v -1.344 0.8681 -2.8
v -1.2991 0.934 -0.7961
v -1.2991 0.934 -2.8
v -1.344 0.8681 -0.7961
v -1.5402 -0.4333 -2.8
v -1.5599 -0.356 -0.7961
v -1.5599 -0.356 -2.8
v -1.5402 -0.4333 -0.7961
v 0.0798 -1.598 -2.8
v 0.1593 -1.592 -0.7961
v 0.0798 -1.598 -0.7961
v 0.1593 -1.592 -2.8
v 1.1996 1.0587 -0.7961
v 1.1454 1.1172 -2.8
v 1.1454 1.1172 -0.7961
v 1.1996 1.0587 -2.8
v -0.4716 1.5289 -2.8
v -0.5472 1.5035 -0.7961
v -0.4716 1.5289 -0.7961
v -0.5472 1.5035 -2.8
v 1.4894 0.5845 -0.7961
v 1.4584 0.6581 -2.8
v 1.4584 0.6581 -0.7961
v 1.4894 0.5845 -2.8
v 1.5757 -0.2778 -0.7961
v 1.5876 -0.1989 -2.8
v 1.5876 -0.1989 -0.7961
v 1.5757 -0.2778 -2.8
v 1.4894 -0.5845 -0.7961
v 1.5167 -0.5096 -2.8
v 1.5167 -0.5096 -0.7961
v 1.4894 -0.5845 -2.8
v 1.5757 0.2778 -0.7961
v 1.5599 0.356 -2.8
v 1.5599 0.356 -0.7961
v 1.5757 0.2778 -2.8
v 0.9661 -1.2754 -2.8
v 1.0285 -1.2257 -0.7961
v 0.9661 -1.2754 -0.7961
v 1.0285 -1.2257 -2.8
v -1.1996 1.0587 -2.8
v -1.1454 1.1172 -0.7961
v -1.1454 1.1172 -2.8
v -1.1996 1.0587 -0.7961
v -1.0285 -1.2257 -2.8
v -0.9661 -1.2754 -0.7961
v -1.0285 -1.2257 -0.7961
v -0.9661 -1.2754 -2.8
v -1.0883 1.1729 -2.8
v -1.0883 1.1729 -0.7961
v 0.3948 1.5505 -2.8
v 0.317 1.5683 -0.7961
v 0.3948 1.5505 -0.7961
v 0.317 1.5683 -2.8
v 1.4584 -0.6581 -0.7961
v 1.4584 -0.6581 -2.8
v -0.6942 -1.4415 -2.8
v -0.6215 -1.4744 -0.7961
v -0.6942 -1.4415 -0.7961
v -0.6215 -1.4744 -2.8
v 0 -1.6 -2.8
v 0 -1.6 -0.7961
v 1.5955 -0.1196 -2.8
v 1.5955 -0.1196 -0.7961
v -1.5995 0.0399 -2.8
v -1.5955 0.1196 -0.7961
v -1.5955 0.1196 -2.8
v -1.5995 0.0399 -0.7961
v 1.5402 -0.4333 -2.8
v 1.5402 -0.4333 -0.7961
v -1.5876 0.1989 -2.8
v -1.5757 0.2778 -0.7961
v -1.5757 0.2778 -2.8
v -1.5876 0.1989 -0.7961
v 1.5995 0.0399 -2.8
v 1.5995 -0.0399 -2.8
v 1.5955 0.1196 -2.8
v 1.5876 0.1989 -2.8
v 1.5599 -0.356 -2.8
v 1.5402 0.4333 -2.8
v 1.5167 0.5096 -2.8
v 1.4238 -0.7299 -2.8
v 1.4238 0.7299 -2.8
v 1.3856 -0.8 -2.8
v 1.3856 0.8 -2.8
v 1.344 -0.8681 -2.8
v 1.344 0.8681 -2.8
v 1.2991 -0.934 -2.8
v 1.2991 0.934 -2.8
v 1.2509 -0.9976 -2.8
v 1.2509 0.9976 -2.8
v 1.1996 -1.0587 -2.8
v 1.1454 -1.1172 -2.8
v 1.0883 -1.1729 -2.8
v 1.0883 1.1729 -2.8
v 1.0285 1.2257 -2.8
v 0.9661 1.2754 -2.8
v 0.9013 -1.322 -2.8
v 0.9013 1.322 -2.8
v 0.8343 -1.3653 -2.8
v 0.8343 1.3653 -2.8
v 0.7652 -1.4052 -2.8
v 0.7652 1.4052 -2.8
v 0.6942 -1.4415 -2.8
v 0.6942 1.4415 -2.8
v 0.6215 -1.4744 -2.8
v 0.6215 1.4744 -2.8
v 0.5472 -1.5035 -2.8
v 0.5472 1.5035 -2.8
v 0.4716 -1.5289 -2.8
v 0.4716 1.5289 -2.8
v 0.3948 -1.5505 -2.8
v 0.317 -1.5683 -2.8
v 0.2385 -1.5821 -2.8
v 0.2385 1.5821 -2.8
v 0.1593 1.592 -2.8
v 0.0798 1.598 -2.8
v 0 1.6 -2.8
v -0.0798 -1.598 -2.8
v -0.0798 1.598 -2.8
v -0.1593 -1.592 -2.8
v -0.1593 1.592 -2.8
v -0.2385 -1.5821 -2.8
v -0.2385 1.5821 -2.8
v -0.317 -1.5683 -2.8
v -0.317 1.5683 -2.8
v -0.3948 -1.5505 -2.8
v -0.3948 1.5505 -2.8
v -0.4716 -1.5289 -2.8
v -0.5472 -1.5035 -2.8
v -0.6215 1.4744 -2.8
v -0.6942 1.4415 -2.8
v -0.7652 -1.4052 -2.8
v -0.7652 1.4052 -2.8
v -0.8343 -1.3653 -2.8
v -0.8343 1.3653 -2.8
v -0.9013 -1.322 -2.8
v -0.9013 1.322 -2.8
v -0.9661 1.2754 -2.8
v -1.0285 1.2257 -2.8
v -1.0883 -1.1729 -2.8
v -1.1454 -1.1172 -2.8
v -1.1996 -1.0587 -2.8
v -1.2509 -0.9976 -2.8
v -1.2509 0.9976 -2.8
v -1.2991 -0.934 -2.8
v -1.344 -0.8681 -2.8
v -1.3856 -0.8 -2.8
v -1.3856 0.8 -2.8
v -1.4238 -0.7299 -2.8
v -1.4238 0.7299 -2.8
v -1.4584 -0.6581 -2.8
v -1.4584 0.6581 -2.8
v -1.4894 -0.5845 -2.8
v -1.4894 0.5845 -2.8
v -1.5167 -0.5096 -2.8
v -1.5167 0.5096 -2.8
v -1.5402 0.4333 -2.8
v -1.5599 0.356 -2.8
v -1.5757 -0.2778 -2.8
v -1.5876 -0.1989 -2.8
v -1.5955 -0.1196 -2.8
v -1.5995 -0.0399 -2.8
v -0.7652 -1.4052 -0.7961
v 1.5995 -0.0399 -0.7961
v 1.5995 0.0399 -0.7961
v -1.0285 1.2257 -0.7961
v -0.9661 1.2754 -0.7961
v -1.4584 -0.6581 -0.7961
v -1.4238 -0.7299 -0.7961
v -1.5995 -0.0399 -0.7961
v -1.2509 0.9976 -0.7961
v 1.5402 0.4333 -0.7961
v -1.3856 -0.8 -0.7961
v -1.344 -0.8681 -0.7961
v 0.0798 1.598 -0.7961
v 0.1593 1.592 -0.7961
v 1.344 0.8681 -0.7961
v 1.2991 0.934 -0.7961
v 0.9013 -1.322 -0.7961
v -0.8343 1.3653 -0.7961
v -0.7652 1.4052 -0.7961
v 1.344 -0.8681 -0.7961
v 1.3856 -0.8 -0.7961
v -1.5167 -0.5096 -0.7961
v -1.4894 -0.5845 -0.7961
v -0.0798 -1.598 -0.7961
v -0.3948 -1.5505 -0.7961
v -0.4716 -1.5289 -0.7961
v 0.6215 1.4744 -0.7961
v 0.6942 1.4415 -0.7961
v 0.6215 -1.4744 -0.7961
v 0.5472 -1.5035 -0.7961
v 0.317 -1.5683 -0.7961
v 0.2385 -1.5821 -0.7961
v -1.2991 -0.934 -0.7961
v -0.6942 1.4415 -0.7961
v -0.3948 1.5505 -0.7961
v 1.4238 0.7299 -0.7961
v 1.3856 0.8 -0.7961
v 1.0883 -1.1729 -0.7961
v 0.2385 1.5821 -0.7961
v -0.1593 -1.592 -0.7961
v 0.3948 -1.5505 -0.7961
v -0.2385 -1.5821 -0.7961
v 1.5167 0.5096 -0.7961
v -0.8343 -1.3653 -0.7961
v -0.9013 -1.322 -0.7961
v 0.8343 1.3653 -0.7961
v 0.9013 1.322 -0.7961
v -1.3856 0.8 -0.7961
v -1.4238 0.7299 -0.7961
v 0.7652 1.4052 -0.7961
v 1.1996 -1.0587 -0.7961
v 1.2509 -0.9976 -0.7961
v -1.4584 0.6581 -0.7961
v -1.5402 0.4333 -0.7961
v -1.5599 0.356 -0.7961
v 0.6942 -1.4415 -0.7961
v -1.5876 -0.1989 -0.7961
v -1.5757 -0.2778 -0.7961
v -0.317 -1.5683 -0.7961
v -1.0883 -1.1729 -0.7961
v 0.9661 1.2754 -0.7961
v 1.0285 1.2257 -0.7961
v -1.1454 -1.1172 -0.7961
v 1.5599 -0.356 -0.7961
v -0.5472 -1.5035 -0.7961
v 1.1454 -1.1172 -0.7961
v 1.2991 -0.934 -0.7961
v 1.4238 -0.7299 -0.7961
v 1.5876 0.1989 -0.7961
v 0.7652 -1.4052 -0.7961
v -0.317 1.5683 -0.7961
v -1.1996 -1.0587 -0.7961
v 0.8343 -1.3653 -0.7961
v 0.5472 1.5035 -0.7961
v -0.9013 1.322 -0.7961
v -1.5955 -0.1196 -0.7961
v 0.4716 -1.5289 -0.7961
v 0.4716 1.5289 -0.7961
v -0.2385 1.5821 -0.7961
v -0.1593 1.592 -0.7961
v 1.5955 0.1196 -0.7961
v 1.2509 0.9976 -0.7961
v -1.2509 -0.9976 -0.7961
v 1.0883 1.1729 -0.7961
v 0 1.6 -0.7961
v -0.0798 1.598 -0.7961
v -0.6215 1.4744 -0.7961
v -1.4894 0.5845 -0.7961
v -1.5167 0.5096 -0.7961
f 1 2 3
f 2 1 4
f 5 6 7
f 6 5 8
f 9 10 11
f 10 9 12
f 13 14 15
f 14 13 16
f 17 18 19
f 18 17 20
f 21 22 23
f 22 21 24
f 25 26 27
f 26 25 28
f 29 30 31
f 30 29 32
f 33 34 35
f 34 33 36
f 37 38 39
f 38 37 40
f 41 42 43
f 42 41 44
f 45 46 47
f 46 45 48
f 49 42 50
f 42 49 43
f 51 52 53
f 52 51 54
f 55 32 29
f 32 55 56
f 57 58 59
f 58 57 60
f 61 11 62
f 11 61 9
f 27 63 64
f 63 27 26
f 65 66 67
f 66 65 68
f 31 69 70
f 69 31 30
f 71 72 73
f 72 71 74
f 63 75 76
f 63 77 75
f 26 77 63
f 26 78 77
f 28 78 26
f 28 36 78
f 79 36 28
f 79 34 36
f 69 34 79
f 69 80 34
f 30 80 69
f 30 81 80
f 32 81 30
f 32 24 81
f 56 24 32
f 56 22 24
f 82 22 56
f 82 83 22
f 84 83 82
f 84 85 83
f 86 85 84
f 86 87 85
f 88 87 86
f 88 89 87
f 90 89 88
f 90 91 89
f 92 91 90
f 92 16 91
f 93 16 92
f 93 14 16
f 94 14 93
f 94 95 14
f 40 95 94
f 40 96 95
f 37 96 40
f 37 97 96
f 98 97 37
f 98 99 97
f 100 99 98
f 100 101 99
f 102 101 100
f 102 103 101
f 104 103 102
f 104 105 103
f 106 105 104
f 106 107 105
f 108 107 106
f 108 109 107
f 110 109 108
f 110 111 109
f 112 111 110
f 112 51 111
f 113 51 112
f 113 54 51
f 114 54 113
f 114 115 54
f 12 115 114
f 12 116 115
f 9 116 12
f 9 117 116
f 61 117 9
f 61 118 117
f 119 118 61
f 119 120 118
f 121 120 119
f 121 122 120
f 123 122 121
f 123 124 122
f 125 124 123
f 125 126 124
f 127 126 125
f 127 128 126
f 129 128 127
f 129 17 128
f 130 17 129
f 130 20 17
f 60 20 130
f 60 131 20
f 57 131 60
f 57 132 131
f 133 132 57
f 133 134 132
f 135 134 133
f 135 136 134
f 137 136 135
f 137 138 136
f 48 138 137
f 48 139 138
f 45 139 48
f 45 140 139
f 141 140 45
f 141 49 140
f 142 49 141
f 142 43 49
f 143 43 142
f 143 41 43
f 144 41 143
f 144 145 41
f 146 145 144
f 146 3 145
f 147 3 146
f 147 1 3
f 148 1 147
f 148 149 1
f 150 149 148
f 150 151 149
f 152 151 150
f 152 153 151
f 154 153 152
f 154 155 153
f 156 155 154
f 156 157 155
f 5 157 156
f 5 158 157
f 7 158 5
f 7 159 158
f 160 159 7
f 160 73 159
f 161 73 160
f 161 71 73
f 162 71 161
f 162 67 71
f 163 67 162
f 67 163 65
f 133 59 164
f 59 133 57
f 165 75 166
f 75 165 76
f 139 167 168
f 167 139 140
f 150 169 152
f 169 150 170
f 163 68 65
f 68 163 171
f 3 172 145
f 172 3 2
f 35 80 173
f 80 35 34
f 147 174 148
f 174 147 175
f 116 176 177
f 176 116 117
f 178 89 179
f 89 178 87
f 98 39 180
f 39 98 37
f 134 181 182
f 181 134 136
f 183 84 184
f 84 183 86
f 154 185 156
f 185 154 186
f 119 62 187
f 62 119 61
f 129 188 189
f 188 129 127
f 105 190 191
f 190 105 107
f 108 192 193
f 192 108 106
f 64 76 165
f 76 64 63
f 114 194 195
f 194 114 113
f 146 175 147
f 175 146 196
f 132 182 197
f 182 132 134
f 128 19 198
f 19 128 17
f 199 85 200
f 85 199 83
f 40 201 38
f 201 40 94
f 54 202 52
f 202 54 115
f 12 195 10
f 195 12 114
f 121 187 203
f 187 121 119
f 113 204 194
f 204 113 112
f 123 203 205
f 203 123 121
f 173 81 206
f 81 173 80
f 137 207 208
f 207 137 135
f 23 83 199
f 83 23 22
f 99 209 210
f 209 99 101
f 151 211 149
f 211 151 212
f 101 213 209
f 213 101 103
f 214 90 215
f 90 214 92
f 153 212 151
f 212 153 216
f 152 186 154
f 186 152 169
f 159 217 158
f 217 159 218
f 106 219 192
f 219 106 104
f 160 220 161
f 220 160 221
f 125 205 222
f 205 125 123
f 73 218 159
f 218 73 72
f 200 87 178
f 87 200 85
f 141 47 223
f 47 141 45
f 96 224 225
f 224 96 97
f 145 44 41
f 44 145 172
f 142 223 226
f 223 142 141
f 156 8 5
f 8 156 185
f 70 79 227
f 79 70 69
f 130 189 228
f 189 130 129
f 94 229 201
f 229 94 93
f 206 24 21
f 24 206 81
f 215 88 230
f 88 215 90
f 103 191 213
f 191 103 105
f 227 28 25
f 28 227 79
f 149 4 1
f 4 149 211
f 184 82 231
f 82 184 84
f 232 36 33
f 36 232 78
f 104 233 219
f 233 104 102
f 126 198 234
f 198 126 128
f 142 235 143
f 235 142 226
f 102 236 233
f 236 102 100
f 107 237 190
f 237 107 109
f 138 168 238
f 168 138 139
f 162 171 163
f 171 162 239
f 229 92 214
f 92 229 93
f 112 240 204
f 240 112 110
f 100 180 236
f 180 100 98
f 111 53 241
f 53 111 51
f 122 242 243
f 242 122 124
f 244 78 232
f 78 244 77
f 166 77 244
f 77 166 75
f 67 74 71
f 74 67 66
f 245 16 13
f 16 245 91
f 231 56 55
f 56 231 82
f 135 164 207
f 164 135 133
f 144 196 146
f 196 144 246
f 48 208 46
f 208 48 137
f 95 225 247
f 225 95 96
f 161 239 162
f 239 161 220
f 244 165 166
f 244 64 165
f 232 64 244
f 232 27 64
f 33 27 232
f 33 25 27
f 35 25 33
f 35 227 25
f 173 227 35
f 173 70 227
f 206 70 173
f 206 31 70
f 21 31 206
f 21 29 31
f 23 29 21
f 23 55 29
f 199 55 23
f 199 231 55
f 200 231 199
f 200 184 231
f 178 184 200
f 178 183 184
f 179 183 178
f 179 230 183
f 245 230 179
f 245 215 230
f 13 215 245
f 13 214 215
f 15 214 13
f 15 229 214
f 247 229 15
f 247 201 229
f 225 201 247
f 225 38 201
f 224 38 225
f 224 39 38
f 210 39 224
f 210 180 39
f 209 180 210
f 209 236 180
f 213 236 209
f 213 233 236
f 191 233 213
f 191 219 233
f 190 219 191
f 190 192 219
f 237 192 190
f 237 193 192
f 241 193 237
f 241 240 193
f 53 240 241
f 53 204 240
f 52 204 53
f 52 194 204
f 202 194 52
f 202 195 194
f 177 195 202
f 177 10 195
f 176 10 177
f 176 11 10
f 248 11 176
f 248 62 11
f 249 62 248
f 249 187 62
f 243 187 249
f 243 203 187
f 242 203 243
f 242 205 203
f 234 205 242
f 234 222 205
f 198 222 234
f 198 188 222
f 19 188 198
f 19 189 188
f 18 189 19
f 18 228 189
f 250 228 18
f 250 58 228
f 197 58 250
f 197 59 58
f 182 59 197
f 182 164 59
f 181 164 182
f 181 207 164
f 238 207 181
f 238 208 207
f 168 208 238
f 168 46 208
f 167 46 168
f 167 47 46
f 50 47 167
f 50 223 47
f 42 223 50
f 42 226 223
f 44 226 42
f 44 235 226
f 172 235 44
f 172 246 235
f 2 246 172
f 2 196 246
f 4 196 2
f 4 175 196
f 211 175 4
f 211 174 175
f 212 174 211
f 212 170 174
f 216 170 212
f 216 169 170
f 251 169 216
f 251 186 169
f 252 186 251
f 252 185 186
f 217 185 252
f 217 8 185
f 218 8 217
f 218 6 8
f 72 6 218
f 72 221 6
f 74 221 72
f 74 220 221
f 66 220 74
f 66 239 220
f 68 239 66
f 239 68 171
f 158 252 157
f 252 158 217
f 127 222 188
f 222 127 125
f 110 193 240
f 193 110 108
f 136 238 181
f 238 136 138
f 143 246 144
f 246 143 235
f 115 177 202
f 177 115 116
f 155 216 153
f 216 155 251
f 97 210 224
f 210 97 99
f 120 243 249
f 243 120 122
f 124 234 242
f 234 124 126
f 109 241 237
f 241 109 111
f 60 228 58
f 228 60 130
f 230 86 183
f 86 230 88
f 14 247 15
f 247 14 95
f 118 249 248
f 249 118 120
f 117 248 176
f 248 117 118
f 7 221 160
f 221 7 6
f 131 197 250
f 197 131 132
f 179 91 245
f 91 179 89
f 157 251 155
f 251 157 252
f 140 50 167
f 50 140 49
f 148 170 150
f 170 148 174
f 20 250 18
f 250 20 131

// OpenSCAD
use <../lib.scad>
use <s/3351as01.scad>
$fa=1; $fs=0.2;
function ldraw_lib__3351ap11(realsolid=false) = [
// 0 Roadsign Triangular Type 1 with Road Works with 2 Piles (Thin Worker) Pattern
// 0 Name: 3351ap11.dat
// 0 Author: J.C. Tchang [tchang]
// 0 !LDRAW_ORG Part UPDATE 2022-04
// 0 !LICENSE Licensed under CC BY 2.0 and CC BY 4.0 : see CAreadme.txt
// 
// 0 BFC CERTIFY CCW
  [0,"BFC","CERTIFY"],
  [0,"BFC","CCW"],
// 
// 0 !KEYWORDS Bricklink 649pb10b, Set 355, set 364, Set 989
// 
// 0 !HISTORY 2010-07-05 [PTadmin] Official Update 2010-02
// 0 !HISTORY 2022-06-22 [Philo] Updated description, added keywords
// 0 !HISTORY 2022-07-18 [PTadmin] Official Update 2022-04
// 
// 
// 1 16 0 0 0 1 0 0 0 1 0 0 0 1 s\3351as01.dat
  [1,16,0,0,0,1,0,0,0,1,0,0,0,1, ldraw_lib__s__3351as01(realsolid)],
// 0 //
// 4 4 -22 -70 -2 -22 -68 -2 22 -68 -2 22 -70 -2
  [4,4,-22,-70,-2,-22,-68,-2,22,-68,-2,22,-70,-2],
// 4 4 22 -70 -2 16.8 -73 -2 -16.8 -73 -2 -22 -70 -2
  [4,4,22,-70,-2,16.8,-73,-2,-16.8,-73,-2,-22,-70,-2],
// 4 4 22 -70 -2 22 -68 -2 23 -68.27 -2 23.73 -69 -2
  [4,4,22,-70,-2,22,-68,-2,23,-68.27,-2,23.73,-69,-2],
// 4 4 22 -70 -2 23.73 -69 -2 24 -70 -2 23.73 -71 -2
  [4,4,22,-70,-2,23.73,-69,-2,24,-70,-2,23.73,-71,-2],
// 4 4 22 -70 -2 23.73 -71 -2 1.73 -109.1 -2 0 -108.1 -2
  [4,4,22,-70,-2,23.73,-71,-2,1.73,-109.1,-2,0,-108.1,-2],
// 4 4 0 -108.1 -2 0 -102.1 -2 16.8 -73 -2 22 -70 -2
  [4,4,0,-108.1,-2,0,-102.1,-2,16.8,-73,-2,22,-70,-2],
// 4 4 -23 -68.27 -2 -22 -68 -2 -22 -70 -2 -23.73 -69 -2
  [4,4,-23,-68.27,-2,-22,-68,-2,-22,-70,-2,-23.73,-69,-2],
// 4 4 -24 -70 -2 -23.73 -69 -2 -22 -70 -2 -23.73 -71 -2
  [4,4,-24,-70,-2,-23.73,-69,-2,-22,-70,-2,-23.73,-71,-2],
// 4 4 0 -108.1 -2 -1.73 -109.1 -2 -23.73 -71 -2 -22 -70 -2
  [4,4,0,-108.1,-2,-1.73,-109.1,-2,-23.73,-71,-2,-22,-70,-2],
// 4 4 -22 -70 -2 -16.8 -73 -2 0 -102.1 -2 0 -108.1 -2
  [4,4,-22,-70,-2,-16.8,-73,-2,0,-102.1,-2,0,-108.1,-2],
// 4 4 -1 -109.83 -2 -1.73 -109.1 -2 0 -108.1 -2 0 -110.1 -2
  [4,4,-1,-109.83,-2,-1.73,-109.1,-2,0,-108.1,-2,0,-110.1,-2],
// 4 4 1 -109.83 -2 0 -110.1 -2 0 -108.1 -2 1.73 -109.1 -2
  [4,4,1,-109.83,-2,0,-110.1,-2,0,-108.1,-2,1.73,-109.1,-2],
// 0 //
// 4 0 -15.2 -73.8 -2 -7.6 -73.8 -2 -8.4 -74.8 -2 -14.4 -74.9 -2
  [4,0,-15.2,-73.8,-2,-7.6,-73.8,-2,-8.4,-74.8,-2,-14.4,-74.9,-2],
// 4 0 -8.9 -76.4 -2 -13.6 -76.4 -2 -14.4 -74.9 -2 -8.4 -74.8 -2
  [4,0,-8.9,-76.4,-2,-13.6,-76.4,-2,-14.4,-74.9,-2,-8.4,-74.8,-2],
// 4 0 -8.9 -76.4 -2 -9.4 -77 -2 -13 -77.2 -2 -13.6 -76.4 -2
  [4,0,-8.9,-76.4,-2,-9.4,-77,-2,-13,-77.2,-2,-13.6,-76.4,-2],
// 4 0 -10.7 -77.5 -2 -12.5 -77.7 -2 -13 -77.2 -2 -9.4 -77 -2
  [4,0,-10.7,-77.5,-2,-12.5,-77.7,-2,-13,-77.2,-2,-9.4,-77,-2],
// 4 0 -10.7 -77.5 -2 -11.2 -77.9 -2 -12 -77.9 -2 -12.5 -77.7 -2
  [4,0,-10.7,-77.5,-2,-11.2,-77.9,-2,-12,-77.9,-2,-12.5,-77.7,-2],
// 4 0 7.8 -80.8 -2 6.8 -79.6 -2 6.6 -78.7 -2 11 -80.7 -2
  [4,0,7.8,-80.8,-2,6.8,-79.6,-2,6.6,-78.7,-2,11,-80.7,-2],
// 4 0 11 -80.7 -2 10.1 -81.4 -2 9 -81.5 -2 7.8 -80.8 -2
  [4,0,11,-80.7,-2,10.1,-81.4,-2,9,-81.5,-2,7.8,-80.8,-2],
// 4 0 5.7 -78 -2 6.6 -77.8 -2 6.6 -78.7 -2 5.9 -78.8 -2
  [4,0,5.7,-78,-2,6.6,-77.8,-2,6.6,-78.7,-2,5.9,-78.8,-2],
// 4 0 5.9 -78.8 -2 5 -79.3 -2 4.5 -78.4 -2 5.7 -78 -2
  [4,0,5.9,-78.8,-2,5,-79.3,-2,4.5,-78.4,-2,5.7,-78,-2],
// 4 0 4.2 -79.8 -2 3.3 -79.3 -2 4.5 -78.4 -2 5 -79.3 -2
  [4,0,4.2,-79.8,-2,3.3,-79.3,-2,4.5,-78.4,-2,5,-79.3,-2],
// 4 0 3.5 -80.5 -2 2.9 -80.3 -2 3.3 -79.3 -2 4.2 -79.8 -2
  [4,0,3.5,-80.5,-2,2.9,-80.3,-2,3.3,-79.3,-2,4.2,-79.8,-2],
// 4 0 3.5 -80.5 -2 3 -81.4 -2 2.4 -81.1 -2 2.9 -80.3 -2
  [4,0,3.5,-80.5,-2,3,-81.4,-2,2.4,-81.1,-2,2.9,-80.3,-2],
// 4 0 2.4 -82.2 -2 2 -81.7 -2 2.4 -81.1 -2 3 -81.4 -2
  [4,0,2.4,-82.2,-2,2,-81.7,-2,2.4,-81.1,-2,3,-81.4,-2],
// 4 0 1.6 -83 -2 1.1 -82.5 -2 2 -81.7 -2 2.4 -82.2 -2
  [4,0,1.6,-83,-2,1.1,-82.5,-2,2,-81.7,-2,2.4,-82.2,-2],
// 4 0 1.6 -83 -2 1 -83.6 -2 0.3 -83.1 -2 1.1 -82.5 -2
  [4,0,1.6,-83,-2,1,-83.6,-2,0.3,-83.1,-2,1.1,-82.5,-2],
// 4 0 1 -83.6 -2 0.7 -84.7 -2 0 -84.4 -2 0.3 -83.1 -2
  [4,0,1,-83.6,-2,0.7,-84.7,-2,0,-84.4,-2,0.3,-83.1,-2],
// 4 0 0.5 -86.5 -2 -0.9 -86.3 -2 0 -84.4 -2 0.7 -84.7 -2
  [4,0,0.5,-86.5,-2,-0.9,-86.3,-2,0,-84.4,-2,0.7,-84.7,-2],
// 4 0 0 -84.4 -2 -0.6 -84.8 -2 -0.7 -83.8 -2 0.3 -83.1 -2
  [4,0,0,-84.4,-2,-0.6,-84.8,-2,-0.7,-83.8,-2,0.3,-83.1,-2],
// 4 0 -1.6 -85.5 -2 -1.8 -84.6 -2 -0.7 -83.8 -2 -0.6 -84.8 -2
  [4,0,-1.6,-85.5,-2,-1.8,-84.6,-2,-0.7,-83.8,-2,-0.6,-84.8,-2],
// 4 0 -1.6 -85.5 -2 -1.4 -86.2 -2 -4.4 -86.4 -2 -4.5 -86.1 -2
  [4,0,-1.6,-85.5,-2,-1.4,-86.2,-2,-4.4,-86.4,-2,-4.5,-86.1,-2],
// 4 0 -4.5 -86.1 -2 -4.9 -85.4 -2 -1.8 -84.6 -2 -1.6 -85.5 -2
  [4,0,-4.5,-86.1,-2,-4.9,-85.4,-2,-1.8,-84.6,-2,-1.6,-85.5,-2],
// 4 0 -4.9 -85.4 -2 -5.1 -84.6 -2 -2.8 -81.3 -2 -1.8 -84.6 -2
  [4,0,-4.9,-85.4,-2,-5.1,-84.6,-2,-2.8,-81.3,-2,-1.8,-84.6,-2],
// 4 0 -5.1 -84.6 -2 -5.2 -82.4 -2 -3.2 -80.1 -2 -2.8 -81.3 -2
  [4,0,-5.1,-84.6,-2,-5.2,-82.4,-2,-3.2,-80.1,-2,-2.8,-81.3,-2],
// 4 0 -5.2 -82.4 -2 -5.3 -81.1 -2 -3.5 -79.7 -2 -3.2 -80.1 -2
  [4,0,-5.2,-82.4,-2,-5.3,-81.1,-2,-3.5,-79.7,-2,-3.2,-80.1,-2],
// 4 0 -5.3 -81.1 -2 -5.8 -79.8 -2 -3.9 -79.2 -2 -3.5 -79.7 -2
  [4,0,-5.3,-81.1,-2,-5.8,-79.8,-2,-3.9,-79.2,-2,-3.5,-79.7,-2],
// 4 0 -5.8 -79.8 -2 -7.8 -76.7 -2 -6.3 -75.9 -2 -3.9 -79.2 -2
  [4,0,-5.8,-79.8,-2,-7.8,-76.7,-2,-6.3,-75.9,-2,-3.9,-79.2,-2],
// 4 0 -7.8 -76.7 -2 -8.1 -75.9 -2 -6.4 -74.8 -2 -6.3 -75.9 -2
  [4,0,-7.8,-76.7,-2,-8.1,-75.9,-2,-6.4,-74.8,-2,-6.3,-75.9,-2],
// 4 0 -8.1 -75.9 -2 -6.9 -74 -2 -6 -74.3 -2 -6.4 -74.8 -2
  [4,0,-8.1,-75.9,-2,-6.9,-74,-2,-6,-74.3,-2,-6.4,-74.8,-2],
// 4 0 -6.9 -74 -2 -6.5 -73.7 -2 -6.1 -73.8 -2 -6 -74.3 -2
  [4,0,-6.9,-74,-2,-6.5,-73.7,-2,-6.1,-73.8,-2,-6,-74.3,-2],
// 4 0 -2.8 -81.3 -2 -1.6 -79.5 -2 -0.3 -81.5 -2 -1.8 -84.6 -2
  [4,0,-2.8,-81.3,-2,-1.6,-79.5,-2,-0.3,-81.5,-2,-1.8,-84.6,-2],
// 4 0 -1.3 -78.1 -2 0.3 -79.9 -2 -0.3 -81.5 -2 -1.6 -79.5 -2
  [4,0,-1.3,-78.1,-2,0.3,-79.9,-2,-0.3,-81.5,-2,-1.6,-79.5,-2],
// 4 0 -1.3 -78.1 -2 -0.9 -74.8 -2 1 -75.1 -2 0.5 -79.1 -2
  [4,0,-1.3,-78.1,-2,-0.9,-74.8,-2,1,-75.1,-2,0.5,-79.1,-2],
// 3 0 -1.3 -78.1 -2 0.5 -79.1 -2 0.3 -79.9 -2
  [3,0,-1.3,-78.1,-2,0.5,-79.1,-2,0.3,-79.9,-2],
// 4 0 -0.7 -74.3 -2 1.2 -74.8 -2 1 -75.1 -2 -0.9 -74.8 -2
  [4,0,-0.7,-74.3,-2,1.2,-74.8,-2,1,-75.1,-2,-0.9,-74.8,-2],
// 3 0 -0.7 -74.3 -2 0 -73.7 -2 1.2 -74.8 -2
  [3,0,-0.7,-74.3,-2,0,-73.7,-2,1.2,-74.8,-2],
// 4 0 2 -73.7 -2 2.2 -74.2 -2 1.2 -74.8 -2 0 -73.7 -2
  [4,0,2,-73.7,-2,2.2,-74.2,-2,1.2,-74.8,-2,0,-73.7,-2],
// 4 0 2.6 -73.7 -2 2.5 -74 -2 2.2 -74.2 -2 2 -73.7 -2
  [4,0,2.6,-73.7,-2,2.5,-74,-2,2.2,-74.2,-2,2,-73.7,-2],
// 3 0 -1.4 -86.2 -2 -0.9 -86.3 -2 0.6 -90.4 -2
  [3,0,-1.4,-86.2,-2,-0.9,-86.3,-2,0.6,-90.4,-2],
// 3 0 -0.9 -86.3 -2 0.5 -86.5 -2 0.6 -90.4 -2
  [3,0,-0.9,-86.3,-2,0.5,-86.5,-2,0.6,-90.4,-2],
// 4 0 -4.6 -87.6 -2 -5 -86.9 -2 -4.4 -86.4 -2 -4 -87.2 -2
  [4,0,-4.6,-87.6,-2,-5,-86.9,-2,-4.4,-86.4,-2,-4,-87.2,-2],
// 4 0 -4.4 -86.4 -2 -1.4 -86.2 -2 0.6 -90.4 -2 -4 -87.2 -2
  [4,0,-4.4,-86.4,-2,-1.4,-86.2,-2,0.6,-90.4,-2,-4,-87.2,-2],
// 4 0 -4.1 -89.3 -2 -4.9 -88.6 -2 -4 -87.2 -2 -3.6 -89.1 -2
  [4,0,-4.1,-89.3,-2,-4.9,-88.6,-2,-4,-87.2,-2,-3.6,-89.1,-2],
// 4 0 0.6 -90.4 -2 -3.2 -89.7 -2 -3.6 -89.1 -2 -4 -87.2 -2
  [4,0,0.6,-90.4,-2,-3.2,-89.7,-2,-3.6,-89.1,-2,-4,-87.2,-2],
// 4 0 -4.1 -89.3 -2 -4.3 -90 -2 -5.5 -90.2 -2 -4.9 -88.6 -2
  [4,0,-4.1,-89.3,-2,-4.3,-90,-2,-5.5,-90.2,-2,-4.9,-88.6,-2],
// 4 0 -3.8 -90.5 -2 -5.3 -91.2 -2 -5.5 -90.2 -2 -4.3 -90 -2
  [4,0,-3.8,-90.5,-2,-5.3,-91.2,-2,-5.5,-90.2,-2,-4.3,-90,-2],
// 4 0 -3.2 -90.5 -2 -4.2 -91.7 -2 -5.3 -91.2 -2 -3.8 -90.5 -2
  [4,0,-3.2,-90.5,-2,-4.2,-91.7,-2,-5.3,-91.2,-2,-3.8,-90.5,-2],
// 3 0 -3.2 -90.5 -2 -0.5 -91.9 -2 -4.2 -91.7 -2
  [3,0,-3.2,-90.5,-2,-0.5,-91.9,-2,-4.2,-91.7,-2],
// 4 0 -0.5 -91.9 -2 -3.2 -90.5 -2 -3.2 -89.7 -2 0.6 -90.4 -2
  [4,0,-0.5,-91.9,-2,-3.2,-90.5,-2,-3.2,-89.7,-2,0.6,-90.4,-2],
// 4 0 0.9 -90.6 -2 0.3 -92.2 -2 -0.5 -91.9 -2 0.6 -90.4 -2
  [4,0,0.9,-90.6,-2,0.3,-92.2,-2,-0.5,-91.9,-2,0.6,-90.4,-2],
// 4 0 0.9 -90.6 -2 1.9 -90.5 -2 1.1 -93 -2 0.3 -92.2 -2
  [4,0,0.9,-90.6,-2,1.9,-90.5,-2,1.1,-93,-2,0.3,-92.2,-2],
// 4 0 1.9 -90.5 -2 2.4 -91 -2 1.5 -93.4 -2 1.1 -93 -2
  [4,0,1.9,-90.5,-2,2.4,-91,-2,1.5,-93.4,-2,1.1,-93,-2],
// 4 0 2.4 -91 -2 2.9 -91.1 -2 3 -91.8 -2 1.5 -93.4 -2
  [4,0,2.4,-91,-2,2.9,-91.1,-2,3,-91.8,-2,1.5,-93.4,-2],
// 4 0 3.2 -92.3 -2 2.2 -93.6 -2 1.5 -93.4 -2 3 -91.8 -2
  [4,0,3.2,-92.3,-2,2.2,-93.6,-2,1.5,-93.4,-2,3,-91.8,-2],
// 4 0 3.2 -92.3 -2 2.9 -93 -2 2.6 -93.3 -2 2.2 -93.6 -2
  [4,0,3.2,-92.3,-2,2.9,-93,-2,2.6,-93.3,-2,2.2,-93.6,-2],
// 3 0 11 -80.7 -2 6.6 -78.7 -2 6.6 -77.8 -2
  [3,0,11,-80.7,-2,6.6,-78.7,-2,6.6,-77.8,-2],
// 4 0 3.7 -73.8 -2 15.1 -73.8 -2 11 -80.7 -2 6.6 -77.8 -2
  [4,0,3.7,-73.8,-2,15.1,-73.8,-2,11,-80.7,-2,6.6,-77.8,-2],
// 0 //
// 4 16 -0.9 -86.3 -2 -1.4 -86.2 -2 -1.6 -85.5 -2 -0.6 -84.8 -2
  [4,16,-0.9,-86.3,-2,-1.4,-86.2,-2,-1.6,-85.5,-2,-0.6,-84.8,-2],
// 3 16 0 -84.4 -2 -0.9 -86.3 -2 -0.6 -84.8 -2
  [3,16,0,-84.4,-2,-0.9,-86.3,-2,-0.6,-84.8,-2],
// 4 16 -4.3 -90 -2 -4.1 -89.3 -2 -3.6 -89.1 -2 -3.2 -89.7 -2
  [4,16,-4.3,-90,-2,-4.1,-89.3,-2,-3.6,-89.1,-2,-3.2,-89.7,-2],
// 4 16 -3.2 -89.7 -2 -3.2 -90.5 -2 -3.8 -90.5 -2 -4.3 -90 -2
  [4,16,-3.2,-89.7,-2,-3.2,-90.5,-2,-3.8,-90.5,-2,-4.3,-90,-2],
// 3 16 -1.6 -79.5 -2 -2.8 -81.3 -2 -3.2 -80.1 -2
  [3,16,-1.6,-79.5,-2,-2.8,-81.3,-2,-3.2,-80.1,-2],
// 3 16 -1.6 -79.5 -2 -3.2 -80.1 -2 -3.5 -79.7 -2
  [3,16,-1.6,-79.5,-2,-3.2,-80.1,-2,-3.5,-79.7,-2],
// 4 16 -3.5 -79.7 -2 -3.9 -79.2 -2 -1.3 -78.1 -2 -1.6 -79.5 -2
  [4,16,-3.5,-79.7,-2,-3.9,-79.2,-2,-1.3,-78.1,-2,-1.6,-79.5,-2],
// 4 16 -3.9 -79.2 -2 -6.3 -75.9 -2 -0.9 -74.8 -2 -1.3 -78.1 -2
  [4,16,-3.9,-79.2,-2,-6.3,-75.9,-2,-0.9,-74.8,-2,-1.3,-78.1,-2],
// 4 16 -6.3 -75.9 -2 -6.4 -74.8 -2 -0.7 -74.3 -2 -0.9 -74.8 -2
  [4,16,-6.3,-75.9,-2,-6.4,-74.8,-2,-0.7,-74.3,-2,-0.9,-74.8,-2],
// 3 16 -6 -74.3 -2 -0.7 -74.3 -2 -6.4 -74.8 -2
  [3,16,-6,-74.3,-2,-0.7,-74.3,-2,-6.4,-74.8,-2],
// 4 16 -6 -74.3 -2 -6.1 -73.8 -2 0 -73.7 -2 -0.7 -74.3 -2
  [4,16,-6,-74.3,-2,-6.1,-73.8,-2,0,-73.7,-2,-0.7,-74.3,-2],
// 3 16 -1.8 -84.6 -2 -0.3 -81.5 -2 -0.7 -83.8 -2
  [3,16,-1.8,-84.6,-2,-0.3,-81.5,-2,-0.7,-83.8,-2],
// 3 16 -0.3 -81.5 -2 0.3 -83.1 -2 -0.7 -83.8 -2
  [3,16,-0.3,-81.5,-2,0.3,-83.1,-2,-0.7,-83.8,-2],
// 4 16 0.3 -79.9 -2 1.1 -82.5 -2 0.3 -83.1 -2 -0.3 -81.5 -2
  [4,16,0.3,-79.9,-2,1.1,-82.5,-2,0.3,-83.1,-2,-0.3,-81.5,-2],
// 4 16 0.3 -79.9 -2 0.5 -79.1 -2 2 -81.7 -2 1.1 -82.5 -2
  [4,16,0.3,-79.9,-2,0.5,-79.1,-2,2,-81.7,-2,1.1,-82.5,-2],
// 4 16 2.4 -81.1 -2 2 -81.7 -2 0.5 -79.1 -2 2.9 -80.3 -2
  [4,16,2.4,-81.1,-2,2,-81.7,-2,0.5,-79.1,-2,2.9,-80.3,-2],
// 3 16 0.5 -79.1 -2 3.3 -79.3 -2 2.9 -80.3 -2
  [3,16,0.5,-79.1,-2,3.3,-79.3,-2,2.9,-80.3,-2],
// 4 16 1 -75.1 -2 4.5 -78.4 -2 3.3 -79.3 -2 0.5 -79.1 -2
  [4,16,1,-75.1,-2,4.5,-78.4,-2,3.3,-79.3,-2,0.5,-79.1,-2],
// 4 16 1 -75.1 -2 1.2 -74.8 -2 5.7 -78 -2 4.5 -78.4 -2
  [4,16,1,-75.1,-2,1.2,-74.8,-2,5.7,-78,-2,4.5,-78.4,-2],
// 4 16 2.2 -74.2 -2 6.6 -77.8 -2 5.7 -78 -2 1.2 -74.8 -2
  [4,16,2.2,-74.2,-2,6.6,-77.8,-2,5.7,-78,-2,1.2,-74.8,-2],
// 3 16 2.5 -74 -2 6.6 -77.8 -2 2.2 -74.2 -2
  [3,16,2.5,-74,-2,6.6,-77.8,-2,2.2,-74.2,-2],
// 4 16 6.6 -77.8 -2 2.5 -74 -2 2.6 -73.7 -2 3.7 -73.8 -2
  [4,16,6.6,-77.8,-2,2.5,-74,-2,2.6,-73.7,-2,3.7,-73.8,-2],
// 4 16 16.8 -73 -2 15.1 -73.8 -2 3.7 -73.8 -2 2.3 -73 -2
  [4,16,16.8,-73,-2,15.1,-73.8,-2,3.7,-73.8,-2,2.3,-73,-2],
// 3 16 2.6 -73.7 -2 2.3 -73 -2 3.7 -73.8 -2
  [3,16,2.6,-73.7,-2,2.3,-73,-2,3.7,-73.8,-2],
// 3 16 2.3 -73 -2 2.6 -73.7 -2 2 -73.7 -2
  [3,16,2.3,-73,-2,2.6,-73.7,-2,2,-73.7,-2],
// 3 16 0 -73.7 -2 2.3 -73 -2 2 -73.7 -2
  [3,16,0,-73.7,-2,2.3,-73,-2,2,-73.7,-2],
// 4 16 2.3 -73 -2 0 -73.7 -2 -6.1 -73.8 -2 -6.6 -73 -2
  [4,16,2.3,-73,-2,0,-73.7,-2,-6.1,-73.8,-2,-6.6,-73,-2],
// 3 16 -6.5 -73.7 -2 -6.6 -73 -2 -6.1 -73.8 -2
  [3,16,-6.5,-73.7,-2,-6.6,-73,-2,-6.1,-73.8,-2],
// 4 16 -6.5 -73.7 -2 -6.9 -74 -2 -7.6 -73.8 -2 -6.6 -73 -2
  [4,16,-6.5,-73.7,-2,-6.9,-74,-2,-7.6,-73.8,-2,-6.6,-73,-2],
// 4 16 -6.6 -73 -2 -7.6 -73.8 -2 -15.2 -73.8 -2 -16.8 -73 -2
  [4,16,-6.6,-73,-2,-7.6,-73.8,-2,-15.2,-73.8,-2,-16.8,-73,-2],
// 4 16 -7.6 -73.8 -2 -6.9 -74 -2 -8.1 -75.9 -2 -8.4 -74.8 -2
  [4,16,-7.6,-73.8,-2,-6.9,-74,-2,-8.1,-75.9,-2,-8.4,-74.8,-2],
// 3 16 -8.4 -74.8 -2 -8.1 -75.9 -2 -8.9 -76.4 -2
  [3,16,-8.4,-74.8,-2,-8.1,-75.9,-2,-8.9,-76.4,-2],
// 4 16 -9.4 -77 -2 -8.9 -76.4 -2 -8.1 -75.9 -2 -7.8 -76.7 -2
  [4,16,-9.4,-77,-2,-8.9,-76.4,-2,-8.1,-75.9,-2,-7.8,-76.7,-2],
// 3 16 -5.8 -79.8 -2 -9.4 -77 -2 -7.8 -76.7 -2
  [3,16,-5.8,-79.8,-2,-9.4,-77,-2,-7.8,-76.7,-2],
// 4 16 -10.7 -77.5 -2 -9.4 -77 -2 -5.8 -79.8 -2 -5.3 -81.1 -2
  [4,16,-10.7,-77.5,-2,-9.4,-77,-2,-5.8,-79.8,-2,-5.3,-81.1,-2],
// 4 16 -5.3 -81.1 -2 -5.2 -82.4 -2 -11.2 -77.9 -2 -10.7 -77.5 -2
  [4,16,-5.3,-81.1,-2,-5.2,-82.4,-2,-11.2,-77.9,-2,-10.7,-77.5,-2],
// 4 16 -12 -77.9 -2 -11.2 -77.9 -2 -5.2 -82.4 -2 -5.1 -84.6 -2
  [4,16,-12,-77.9,-2,-11.2,-77.9,-2,-5.2,-82.4,-2,-5.1,-84.6,-2],
// 4 16 -16.8 -73 -2 -15.2 -73.8 -2 -14.4 -74.9 -2 -14.4863 -77.0076 -2
  [4,16,-16.8,-73,-2,-15.2,-73.8,-2,-14.4,-74.9,-2,-14.4863,-77.0076,-2],
// 3 16 -13.6 -76.4 -2 -14.4863 -77.0076 -2 -14.4 -74.9 -2
  [3,16,-13.6,-76.4,-2,-14.4863,-77.0076,-2,-14.4,-74.9,-2],
// 3 16 -14.4863 -77.0076 -2 -13.6 -76.4 -2 -13 -77.2 -2
  [3,16,-14.4863,-77.0076,-2,-13.6,-76.4,-2,-13,-77.2,-2],
// 4 16 -14.4863 -77.0076 -2 -13 -77.2 -2 -12.5 -77.7 -2 -13.1271 -79.362 -2
  [4,16,-14.4863,-77.0076,-2,-13,-77.2,-2,-12.5,-77.7,-2,-13.1271,-79.362,-2],
// 3 16 -12 -77.9 -2 -13.1271 -79.362 -2 -12.5 -77.7 -2
  [3,16,-12,-77.9,-2,-13.1271,-79.362,-2,-12.5,-77.7,-2],
// 4 16 -13.1271 -79.362 -2 -12 -77.9 -2 -5.1 -84.6 -2 -4.9 -85.4 -2
  [4,16,-13.1271,-79.362,-2,-12,-77.9,-2,-5.1,-84.6,-2,-4.9,-85.4,-2],
// 4 16 -4.5 -86.1 -2 -4.4 -86.4 -2 -5 -86.9 -2 -4.9 -85.4 -2
  [4,16,-4.5,-86.1,-2,-4.4,-86.4,-2,-5,-86.9,-2,-4.9,-85.4,-2],
// 3 16 -4.9 -85.4 -2 -5 -86.9 -2 -13.1271 -79.362 -2
  [3,16,-4.9,-85.4,-2,-5,-86.9,-2,-13.1271,-79.362,-2],
// 3 16 -4 -87.2 -2 -4.9 -88.6 -2 -4.6 -87.6 -2
  [3,16,-4,-87.2,-2,-4.9,-88.6,-2,-4.6,-87.6,-2],
// 4 16 -5 -86.9 -2 -4.6 -87.6 -2 -4.9 -88.6 -2 -13.1271 -79.362 -2
  [4,16,-5,-86.9,-2,-4.6,-87.6,-2,-4.9,-88.6,-2,-13.1271,-79.362,-2],
// 3 16 -5.5 -90.2 -2 -13.1271 -79.362 -2 -4.9 -88.6 -2
  [3,16,-5.5,-90.2,-2,-13.1271,-79.362,-2,-4.9,-88.6,-2],
// 3 16 -13.1271 -79.362 -2 -5.5 -90.2 -2 -5.3 -91.2 -2
  [3,16,-13.1271,-79.362,-2,-5.5,-90.2,-2,-5.3,-91.2,-2],
// 3 16 0 -102.1 -2 -13.1271 -79.362 -2 -5.3 -91.2 -2
  [3,16,0,-102.1,-2,-13.1271,-79.362,-2,-5.3,-91.2,-2],
// 3 16 -4.2 -91.7 -2 0 -102.1 -2 -5.3 -91.2 -2
  [3,16,-4.2,-91.7,-2,0,-102.1,-2,-5.3,-91.2,-2],
// 4 16 0 -102.1 -2 -4.2 -91.7 -2 -0.5 -91.9 -2 0.3 -92.2 -2
  [4,16,0,-102.1,-2,-4.2,-91.7,-2,-0.5,-91.9,-2,0.3,-92.2,-2],
// 3 16 0 -102.1 -2 0.3 -92.2 -2 1.1 -93 -2
  [3,16,0,-102.1,-2,0.3,-92.2,-2,1.1,-93,-2],
// 3 16 1.5 -93.4 -2 0 -102.1 -2 1.1 -93 -2
  [3,16,1.5,-93.4,-2,0,-102.1,-2,1.1,-93,-2],
// 3 16 0 -102.1 -2 1.5 -93.4 -2 2.2 -93.6 -2
  [3,16,0,-102.1,-2,1.5,-93.4,-2,2.2,-93.6,-2],
// 3 16 2.6 -93.3 -2 0 -102.1 -2 2.2 -93.6 -2
  [3,16,2.6,-93.3,-2,0,-102.1,-2,2.2,-93.6,-2],
// 4 16 0 -102.1 -2 2.6 -93.3 -2 2.9 -93 -2 5.0286 -93.3897 -2
  [4,16,0,-102.1,-2,2.6,-93.3,-2,2.9,-93,-2,5.0286,-93.3897,-2],
// 3 16 3.2 -92.3 -2 5.0286 -93.3897 -2 2.9 -93 -2
  [3,16,3.2,-92.3,-2,5.0286,-93.3897,-2,2.9,-93,-2],
// 4 16 5.0286 -93.3897 -2 3.2 -92.3 -2 3 -91.8 -2 2.9 -91.1 -2
  [4,16,5.0286,-93.3897,-2,3.2,-92.3,-2,3,-91.8,-2,2.9,-91.1,-2],
// 4 16 1.9 -90.5 -2 0.9 -90.6 -2 0.6 -90.4 -2 0.5 -86.5 -2
  [4,16,1.9,-90.5,-2,0.9,-90.6,-2,0.6,-90.4,-2,0.5,-86.5,-2],
// 4 16 0.5 -86.5 -2 0.7 -84.7 -2 2.4 -91 -2 1.9 -90.5 -2
  [4,16,0.5,-86.5,-2,0.7,-84.7,-2,2.4,-91,-2,1.9,-90.5,-2],
// 4 16 1 -83.6 -2 2.9 -91.1 -2 2.4 -91 -2 0.7 -84.7 -2
  [4,16,1,-83.6,-2,2.9,-91.1,-2,2.4,-91,-2,0.7,-84.7,-2],
// 4 16 5.0286 -93.3897 -2 2.9 -91.1 -2 1 -83.6 -2 1.6 -83 -2
  [4,16,5.0286,-93.3897,-2,2.9,-91.1,-2,1,-83.6,-2,1.6,-83,-2],
// 4 16 5.9 -78.8 -2 6.6 -78.7 -2 6.8 -79.6 -2 5 -79.3 -2
  [4,16,5.9,-78.8,-2,6.6,-78.7,-2,6.8,-79.6,-2,5,-79.3,-2],
// 4 16 7.8 -80.8 -2 4.2 -79.8 -2 5 -79.3 -2 6.8 -79.6 -2
  [4,16,7.8,-80.8,-2,4.2,-79.8,-2,5,-79.3,-2,6.8,-79.6,-2],
// 4 16 7.8 -80.8 -2 9 -81.5 -2 3.5 -80.5 -2 4.2 -79.8 -2
  [4,16,7.8,-80.8,-2,9,-81.5,-2,3.5,-80.5,-2,4.2,-79.8,-2],
// 3 16 9 -81.5 -2 3 -81.4 -2 3.5 -80.5 -2
  [3,16,9,-81.5,-2,3,-81.4,-2,3.5,-80.5,-2],
// 3 16 3 -81.4 -2 9 -81.5 -2 2.4 -82.2 -2
  [3,16,3,-81.4,-2,9,-81.5,-2,2.4,-82.2,-2],
// 4 16 1.6 -83 -2 2.4 -82.2 -2 9 -81.5 -2 5.0286 -93.3897 -2
  [4,16,1.6,-83,-2,2.4,-82.2,-2,9,-81.5,-2,5.0286,-93.3897,-2],
// 3 16 10.1 -81.4 -2 5.0286 -93.3897 -2 9 -81.5 -2
  [3,16,10.1,-81.4,-2,5.0286,-93.3897,-2,9,-81.5,-2],
// 4 16 5.0286 -93.3897 -2 10.1 -81.4 -2 11 -80.7 -2 11.6098 -81.9902 -2
  [4,16,5.0286,-93.3897,-2,10.1,-81.4,-2,11,-80.7,-2,11.6098,-81.9902,-2],
// 4 16 11.6098 -81.9902 -2 11 -80.7 -2 15.1 -73.8 -2 16.8 -73 -2
  [4,16,11.6098,-81.9902,-2,11,-80.7,-2,15.1,-73.8,-2,16.8,-73,-2],
// 0 //
];
module ldraw_lib__3351ap11(step=0, col=false, unit=2/5, alt=false, line=0.2, solid=!$preview)
    makepoly(ldraw_lib__3351ap11(solid), step=step, col=col, unit=unit, alt=alt, line=line, solid=solid);
ldraw_lib__3351ap11(line=0.2);
